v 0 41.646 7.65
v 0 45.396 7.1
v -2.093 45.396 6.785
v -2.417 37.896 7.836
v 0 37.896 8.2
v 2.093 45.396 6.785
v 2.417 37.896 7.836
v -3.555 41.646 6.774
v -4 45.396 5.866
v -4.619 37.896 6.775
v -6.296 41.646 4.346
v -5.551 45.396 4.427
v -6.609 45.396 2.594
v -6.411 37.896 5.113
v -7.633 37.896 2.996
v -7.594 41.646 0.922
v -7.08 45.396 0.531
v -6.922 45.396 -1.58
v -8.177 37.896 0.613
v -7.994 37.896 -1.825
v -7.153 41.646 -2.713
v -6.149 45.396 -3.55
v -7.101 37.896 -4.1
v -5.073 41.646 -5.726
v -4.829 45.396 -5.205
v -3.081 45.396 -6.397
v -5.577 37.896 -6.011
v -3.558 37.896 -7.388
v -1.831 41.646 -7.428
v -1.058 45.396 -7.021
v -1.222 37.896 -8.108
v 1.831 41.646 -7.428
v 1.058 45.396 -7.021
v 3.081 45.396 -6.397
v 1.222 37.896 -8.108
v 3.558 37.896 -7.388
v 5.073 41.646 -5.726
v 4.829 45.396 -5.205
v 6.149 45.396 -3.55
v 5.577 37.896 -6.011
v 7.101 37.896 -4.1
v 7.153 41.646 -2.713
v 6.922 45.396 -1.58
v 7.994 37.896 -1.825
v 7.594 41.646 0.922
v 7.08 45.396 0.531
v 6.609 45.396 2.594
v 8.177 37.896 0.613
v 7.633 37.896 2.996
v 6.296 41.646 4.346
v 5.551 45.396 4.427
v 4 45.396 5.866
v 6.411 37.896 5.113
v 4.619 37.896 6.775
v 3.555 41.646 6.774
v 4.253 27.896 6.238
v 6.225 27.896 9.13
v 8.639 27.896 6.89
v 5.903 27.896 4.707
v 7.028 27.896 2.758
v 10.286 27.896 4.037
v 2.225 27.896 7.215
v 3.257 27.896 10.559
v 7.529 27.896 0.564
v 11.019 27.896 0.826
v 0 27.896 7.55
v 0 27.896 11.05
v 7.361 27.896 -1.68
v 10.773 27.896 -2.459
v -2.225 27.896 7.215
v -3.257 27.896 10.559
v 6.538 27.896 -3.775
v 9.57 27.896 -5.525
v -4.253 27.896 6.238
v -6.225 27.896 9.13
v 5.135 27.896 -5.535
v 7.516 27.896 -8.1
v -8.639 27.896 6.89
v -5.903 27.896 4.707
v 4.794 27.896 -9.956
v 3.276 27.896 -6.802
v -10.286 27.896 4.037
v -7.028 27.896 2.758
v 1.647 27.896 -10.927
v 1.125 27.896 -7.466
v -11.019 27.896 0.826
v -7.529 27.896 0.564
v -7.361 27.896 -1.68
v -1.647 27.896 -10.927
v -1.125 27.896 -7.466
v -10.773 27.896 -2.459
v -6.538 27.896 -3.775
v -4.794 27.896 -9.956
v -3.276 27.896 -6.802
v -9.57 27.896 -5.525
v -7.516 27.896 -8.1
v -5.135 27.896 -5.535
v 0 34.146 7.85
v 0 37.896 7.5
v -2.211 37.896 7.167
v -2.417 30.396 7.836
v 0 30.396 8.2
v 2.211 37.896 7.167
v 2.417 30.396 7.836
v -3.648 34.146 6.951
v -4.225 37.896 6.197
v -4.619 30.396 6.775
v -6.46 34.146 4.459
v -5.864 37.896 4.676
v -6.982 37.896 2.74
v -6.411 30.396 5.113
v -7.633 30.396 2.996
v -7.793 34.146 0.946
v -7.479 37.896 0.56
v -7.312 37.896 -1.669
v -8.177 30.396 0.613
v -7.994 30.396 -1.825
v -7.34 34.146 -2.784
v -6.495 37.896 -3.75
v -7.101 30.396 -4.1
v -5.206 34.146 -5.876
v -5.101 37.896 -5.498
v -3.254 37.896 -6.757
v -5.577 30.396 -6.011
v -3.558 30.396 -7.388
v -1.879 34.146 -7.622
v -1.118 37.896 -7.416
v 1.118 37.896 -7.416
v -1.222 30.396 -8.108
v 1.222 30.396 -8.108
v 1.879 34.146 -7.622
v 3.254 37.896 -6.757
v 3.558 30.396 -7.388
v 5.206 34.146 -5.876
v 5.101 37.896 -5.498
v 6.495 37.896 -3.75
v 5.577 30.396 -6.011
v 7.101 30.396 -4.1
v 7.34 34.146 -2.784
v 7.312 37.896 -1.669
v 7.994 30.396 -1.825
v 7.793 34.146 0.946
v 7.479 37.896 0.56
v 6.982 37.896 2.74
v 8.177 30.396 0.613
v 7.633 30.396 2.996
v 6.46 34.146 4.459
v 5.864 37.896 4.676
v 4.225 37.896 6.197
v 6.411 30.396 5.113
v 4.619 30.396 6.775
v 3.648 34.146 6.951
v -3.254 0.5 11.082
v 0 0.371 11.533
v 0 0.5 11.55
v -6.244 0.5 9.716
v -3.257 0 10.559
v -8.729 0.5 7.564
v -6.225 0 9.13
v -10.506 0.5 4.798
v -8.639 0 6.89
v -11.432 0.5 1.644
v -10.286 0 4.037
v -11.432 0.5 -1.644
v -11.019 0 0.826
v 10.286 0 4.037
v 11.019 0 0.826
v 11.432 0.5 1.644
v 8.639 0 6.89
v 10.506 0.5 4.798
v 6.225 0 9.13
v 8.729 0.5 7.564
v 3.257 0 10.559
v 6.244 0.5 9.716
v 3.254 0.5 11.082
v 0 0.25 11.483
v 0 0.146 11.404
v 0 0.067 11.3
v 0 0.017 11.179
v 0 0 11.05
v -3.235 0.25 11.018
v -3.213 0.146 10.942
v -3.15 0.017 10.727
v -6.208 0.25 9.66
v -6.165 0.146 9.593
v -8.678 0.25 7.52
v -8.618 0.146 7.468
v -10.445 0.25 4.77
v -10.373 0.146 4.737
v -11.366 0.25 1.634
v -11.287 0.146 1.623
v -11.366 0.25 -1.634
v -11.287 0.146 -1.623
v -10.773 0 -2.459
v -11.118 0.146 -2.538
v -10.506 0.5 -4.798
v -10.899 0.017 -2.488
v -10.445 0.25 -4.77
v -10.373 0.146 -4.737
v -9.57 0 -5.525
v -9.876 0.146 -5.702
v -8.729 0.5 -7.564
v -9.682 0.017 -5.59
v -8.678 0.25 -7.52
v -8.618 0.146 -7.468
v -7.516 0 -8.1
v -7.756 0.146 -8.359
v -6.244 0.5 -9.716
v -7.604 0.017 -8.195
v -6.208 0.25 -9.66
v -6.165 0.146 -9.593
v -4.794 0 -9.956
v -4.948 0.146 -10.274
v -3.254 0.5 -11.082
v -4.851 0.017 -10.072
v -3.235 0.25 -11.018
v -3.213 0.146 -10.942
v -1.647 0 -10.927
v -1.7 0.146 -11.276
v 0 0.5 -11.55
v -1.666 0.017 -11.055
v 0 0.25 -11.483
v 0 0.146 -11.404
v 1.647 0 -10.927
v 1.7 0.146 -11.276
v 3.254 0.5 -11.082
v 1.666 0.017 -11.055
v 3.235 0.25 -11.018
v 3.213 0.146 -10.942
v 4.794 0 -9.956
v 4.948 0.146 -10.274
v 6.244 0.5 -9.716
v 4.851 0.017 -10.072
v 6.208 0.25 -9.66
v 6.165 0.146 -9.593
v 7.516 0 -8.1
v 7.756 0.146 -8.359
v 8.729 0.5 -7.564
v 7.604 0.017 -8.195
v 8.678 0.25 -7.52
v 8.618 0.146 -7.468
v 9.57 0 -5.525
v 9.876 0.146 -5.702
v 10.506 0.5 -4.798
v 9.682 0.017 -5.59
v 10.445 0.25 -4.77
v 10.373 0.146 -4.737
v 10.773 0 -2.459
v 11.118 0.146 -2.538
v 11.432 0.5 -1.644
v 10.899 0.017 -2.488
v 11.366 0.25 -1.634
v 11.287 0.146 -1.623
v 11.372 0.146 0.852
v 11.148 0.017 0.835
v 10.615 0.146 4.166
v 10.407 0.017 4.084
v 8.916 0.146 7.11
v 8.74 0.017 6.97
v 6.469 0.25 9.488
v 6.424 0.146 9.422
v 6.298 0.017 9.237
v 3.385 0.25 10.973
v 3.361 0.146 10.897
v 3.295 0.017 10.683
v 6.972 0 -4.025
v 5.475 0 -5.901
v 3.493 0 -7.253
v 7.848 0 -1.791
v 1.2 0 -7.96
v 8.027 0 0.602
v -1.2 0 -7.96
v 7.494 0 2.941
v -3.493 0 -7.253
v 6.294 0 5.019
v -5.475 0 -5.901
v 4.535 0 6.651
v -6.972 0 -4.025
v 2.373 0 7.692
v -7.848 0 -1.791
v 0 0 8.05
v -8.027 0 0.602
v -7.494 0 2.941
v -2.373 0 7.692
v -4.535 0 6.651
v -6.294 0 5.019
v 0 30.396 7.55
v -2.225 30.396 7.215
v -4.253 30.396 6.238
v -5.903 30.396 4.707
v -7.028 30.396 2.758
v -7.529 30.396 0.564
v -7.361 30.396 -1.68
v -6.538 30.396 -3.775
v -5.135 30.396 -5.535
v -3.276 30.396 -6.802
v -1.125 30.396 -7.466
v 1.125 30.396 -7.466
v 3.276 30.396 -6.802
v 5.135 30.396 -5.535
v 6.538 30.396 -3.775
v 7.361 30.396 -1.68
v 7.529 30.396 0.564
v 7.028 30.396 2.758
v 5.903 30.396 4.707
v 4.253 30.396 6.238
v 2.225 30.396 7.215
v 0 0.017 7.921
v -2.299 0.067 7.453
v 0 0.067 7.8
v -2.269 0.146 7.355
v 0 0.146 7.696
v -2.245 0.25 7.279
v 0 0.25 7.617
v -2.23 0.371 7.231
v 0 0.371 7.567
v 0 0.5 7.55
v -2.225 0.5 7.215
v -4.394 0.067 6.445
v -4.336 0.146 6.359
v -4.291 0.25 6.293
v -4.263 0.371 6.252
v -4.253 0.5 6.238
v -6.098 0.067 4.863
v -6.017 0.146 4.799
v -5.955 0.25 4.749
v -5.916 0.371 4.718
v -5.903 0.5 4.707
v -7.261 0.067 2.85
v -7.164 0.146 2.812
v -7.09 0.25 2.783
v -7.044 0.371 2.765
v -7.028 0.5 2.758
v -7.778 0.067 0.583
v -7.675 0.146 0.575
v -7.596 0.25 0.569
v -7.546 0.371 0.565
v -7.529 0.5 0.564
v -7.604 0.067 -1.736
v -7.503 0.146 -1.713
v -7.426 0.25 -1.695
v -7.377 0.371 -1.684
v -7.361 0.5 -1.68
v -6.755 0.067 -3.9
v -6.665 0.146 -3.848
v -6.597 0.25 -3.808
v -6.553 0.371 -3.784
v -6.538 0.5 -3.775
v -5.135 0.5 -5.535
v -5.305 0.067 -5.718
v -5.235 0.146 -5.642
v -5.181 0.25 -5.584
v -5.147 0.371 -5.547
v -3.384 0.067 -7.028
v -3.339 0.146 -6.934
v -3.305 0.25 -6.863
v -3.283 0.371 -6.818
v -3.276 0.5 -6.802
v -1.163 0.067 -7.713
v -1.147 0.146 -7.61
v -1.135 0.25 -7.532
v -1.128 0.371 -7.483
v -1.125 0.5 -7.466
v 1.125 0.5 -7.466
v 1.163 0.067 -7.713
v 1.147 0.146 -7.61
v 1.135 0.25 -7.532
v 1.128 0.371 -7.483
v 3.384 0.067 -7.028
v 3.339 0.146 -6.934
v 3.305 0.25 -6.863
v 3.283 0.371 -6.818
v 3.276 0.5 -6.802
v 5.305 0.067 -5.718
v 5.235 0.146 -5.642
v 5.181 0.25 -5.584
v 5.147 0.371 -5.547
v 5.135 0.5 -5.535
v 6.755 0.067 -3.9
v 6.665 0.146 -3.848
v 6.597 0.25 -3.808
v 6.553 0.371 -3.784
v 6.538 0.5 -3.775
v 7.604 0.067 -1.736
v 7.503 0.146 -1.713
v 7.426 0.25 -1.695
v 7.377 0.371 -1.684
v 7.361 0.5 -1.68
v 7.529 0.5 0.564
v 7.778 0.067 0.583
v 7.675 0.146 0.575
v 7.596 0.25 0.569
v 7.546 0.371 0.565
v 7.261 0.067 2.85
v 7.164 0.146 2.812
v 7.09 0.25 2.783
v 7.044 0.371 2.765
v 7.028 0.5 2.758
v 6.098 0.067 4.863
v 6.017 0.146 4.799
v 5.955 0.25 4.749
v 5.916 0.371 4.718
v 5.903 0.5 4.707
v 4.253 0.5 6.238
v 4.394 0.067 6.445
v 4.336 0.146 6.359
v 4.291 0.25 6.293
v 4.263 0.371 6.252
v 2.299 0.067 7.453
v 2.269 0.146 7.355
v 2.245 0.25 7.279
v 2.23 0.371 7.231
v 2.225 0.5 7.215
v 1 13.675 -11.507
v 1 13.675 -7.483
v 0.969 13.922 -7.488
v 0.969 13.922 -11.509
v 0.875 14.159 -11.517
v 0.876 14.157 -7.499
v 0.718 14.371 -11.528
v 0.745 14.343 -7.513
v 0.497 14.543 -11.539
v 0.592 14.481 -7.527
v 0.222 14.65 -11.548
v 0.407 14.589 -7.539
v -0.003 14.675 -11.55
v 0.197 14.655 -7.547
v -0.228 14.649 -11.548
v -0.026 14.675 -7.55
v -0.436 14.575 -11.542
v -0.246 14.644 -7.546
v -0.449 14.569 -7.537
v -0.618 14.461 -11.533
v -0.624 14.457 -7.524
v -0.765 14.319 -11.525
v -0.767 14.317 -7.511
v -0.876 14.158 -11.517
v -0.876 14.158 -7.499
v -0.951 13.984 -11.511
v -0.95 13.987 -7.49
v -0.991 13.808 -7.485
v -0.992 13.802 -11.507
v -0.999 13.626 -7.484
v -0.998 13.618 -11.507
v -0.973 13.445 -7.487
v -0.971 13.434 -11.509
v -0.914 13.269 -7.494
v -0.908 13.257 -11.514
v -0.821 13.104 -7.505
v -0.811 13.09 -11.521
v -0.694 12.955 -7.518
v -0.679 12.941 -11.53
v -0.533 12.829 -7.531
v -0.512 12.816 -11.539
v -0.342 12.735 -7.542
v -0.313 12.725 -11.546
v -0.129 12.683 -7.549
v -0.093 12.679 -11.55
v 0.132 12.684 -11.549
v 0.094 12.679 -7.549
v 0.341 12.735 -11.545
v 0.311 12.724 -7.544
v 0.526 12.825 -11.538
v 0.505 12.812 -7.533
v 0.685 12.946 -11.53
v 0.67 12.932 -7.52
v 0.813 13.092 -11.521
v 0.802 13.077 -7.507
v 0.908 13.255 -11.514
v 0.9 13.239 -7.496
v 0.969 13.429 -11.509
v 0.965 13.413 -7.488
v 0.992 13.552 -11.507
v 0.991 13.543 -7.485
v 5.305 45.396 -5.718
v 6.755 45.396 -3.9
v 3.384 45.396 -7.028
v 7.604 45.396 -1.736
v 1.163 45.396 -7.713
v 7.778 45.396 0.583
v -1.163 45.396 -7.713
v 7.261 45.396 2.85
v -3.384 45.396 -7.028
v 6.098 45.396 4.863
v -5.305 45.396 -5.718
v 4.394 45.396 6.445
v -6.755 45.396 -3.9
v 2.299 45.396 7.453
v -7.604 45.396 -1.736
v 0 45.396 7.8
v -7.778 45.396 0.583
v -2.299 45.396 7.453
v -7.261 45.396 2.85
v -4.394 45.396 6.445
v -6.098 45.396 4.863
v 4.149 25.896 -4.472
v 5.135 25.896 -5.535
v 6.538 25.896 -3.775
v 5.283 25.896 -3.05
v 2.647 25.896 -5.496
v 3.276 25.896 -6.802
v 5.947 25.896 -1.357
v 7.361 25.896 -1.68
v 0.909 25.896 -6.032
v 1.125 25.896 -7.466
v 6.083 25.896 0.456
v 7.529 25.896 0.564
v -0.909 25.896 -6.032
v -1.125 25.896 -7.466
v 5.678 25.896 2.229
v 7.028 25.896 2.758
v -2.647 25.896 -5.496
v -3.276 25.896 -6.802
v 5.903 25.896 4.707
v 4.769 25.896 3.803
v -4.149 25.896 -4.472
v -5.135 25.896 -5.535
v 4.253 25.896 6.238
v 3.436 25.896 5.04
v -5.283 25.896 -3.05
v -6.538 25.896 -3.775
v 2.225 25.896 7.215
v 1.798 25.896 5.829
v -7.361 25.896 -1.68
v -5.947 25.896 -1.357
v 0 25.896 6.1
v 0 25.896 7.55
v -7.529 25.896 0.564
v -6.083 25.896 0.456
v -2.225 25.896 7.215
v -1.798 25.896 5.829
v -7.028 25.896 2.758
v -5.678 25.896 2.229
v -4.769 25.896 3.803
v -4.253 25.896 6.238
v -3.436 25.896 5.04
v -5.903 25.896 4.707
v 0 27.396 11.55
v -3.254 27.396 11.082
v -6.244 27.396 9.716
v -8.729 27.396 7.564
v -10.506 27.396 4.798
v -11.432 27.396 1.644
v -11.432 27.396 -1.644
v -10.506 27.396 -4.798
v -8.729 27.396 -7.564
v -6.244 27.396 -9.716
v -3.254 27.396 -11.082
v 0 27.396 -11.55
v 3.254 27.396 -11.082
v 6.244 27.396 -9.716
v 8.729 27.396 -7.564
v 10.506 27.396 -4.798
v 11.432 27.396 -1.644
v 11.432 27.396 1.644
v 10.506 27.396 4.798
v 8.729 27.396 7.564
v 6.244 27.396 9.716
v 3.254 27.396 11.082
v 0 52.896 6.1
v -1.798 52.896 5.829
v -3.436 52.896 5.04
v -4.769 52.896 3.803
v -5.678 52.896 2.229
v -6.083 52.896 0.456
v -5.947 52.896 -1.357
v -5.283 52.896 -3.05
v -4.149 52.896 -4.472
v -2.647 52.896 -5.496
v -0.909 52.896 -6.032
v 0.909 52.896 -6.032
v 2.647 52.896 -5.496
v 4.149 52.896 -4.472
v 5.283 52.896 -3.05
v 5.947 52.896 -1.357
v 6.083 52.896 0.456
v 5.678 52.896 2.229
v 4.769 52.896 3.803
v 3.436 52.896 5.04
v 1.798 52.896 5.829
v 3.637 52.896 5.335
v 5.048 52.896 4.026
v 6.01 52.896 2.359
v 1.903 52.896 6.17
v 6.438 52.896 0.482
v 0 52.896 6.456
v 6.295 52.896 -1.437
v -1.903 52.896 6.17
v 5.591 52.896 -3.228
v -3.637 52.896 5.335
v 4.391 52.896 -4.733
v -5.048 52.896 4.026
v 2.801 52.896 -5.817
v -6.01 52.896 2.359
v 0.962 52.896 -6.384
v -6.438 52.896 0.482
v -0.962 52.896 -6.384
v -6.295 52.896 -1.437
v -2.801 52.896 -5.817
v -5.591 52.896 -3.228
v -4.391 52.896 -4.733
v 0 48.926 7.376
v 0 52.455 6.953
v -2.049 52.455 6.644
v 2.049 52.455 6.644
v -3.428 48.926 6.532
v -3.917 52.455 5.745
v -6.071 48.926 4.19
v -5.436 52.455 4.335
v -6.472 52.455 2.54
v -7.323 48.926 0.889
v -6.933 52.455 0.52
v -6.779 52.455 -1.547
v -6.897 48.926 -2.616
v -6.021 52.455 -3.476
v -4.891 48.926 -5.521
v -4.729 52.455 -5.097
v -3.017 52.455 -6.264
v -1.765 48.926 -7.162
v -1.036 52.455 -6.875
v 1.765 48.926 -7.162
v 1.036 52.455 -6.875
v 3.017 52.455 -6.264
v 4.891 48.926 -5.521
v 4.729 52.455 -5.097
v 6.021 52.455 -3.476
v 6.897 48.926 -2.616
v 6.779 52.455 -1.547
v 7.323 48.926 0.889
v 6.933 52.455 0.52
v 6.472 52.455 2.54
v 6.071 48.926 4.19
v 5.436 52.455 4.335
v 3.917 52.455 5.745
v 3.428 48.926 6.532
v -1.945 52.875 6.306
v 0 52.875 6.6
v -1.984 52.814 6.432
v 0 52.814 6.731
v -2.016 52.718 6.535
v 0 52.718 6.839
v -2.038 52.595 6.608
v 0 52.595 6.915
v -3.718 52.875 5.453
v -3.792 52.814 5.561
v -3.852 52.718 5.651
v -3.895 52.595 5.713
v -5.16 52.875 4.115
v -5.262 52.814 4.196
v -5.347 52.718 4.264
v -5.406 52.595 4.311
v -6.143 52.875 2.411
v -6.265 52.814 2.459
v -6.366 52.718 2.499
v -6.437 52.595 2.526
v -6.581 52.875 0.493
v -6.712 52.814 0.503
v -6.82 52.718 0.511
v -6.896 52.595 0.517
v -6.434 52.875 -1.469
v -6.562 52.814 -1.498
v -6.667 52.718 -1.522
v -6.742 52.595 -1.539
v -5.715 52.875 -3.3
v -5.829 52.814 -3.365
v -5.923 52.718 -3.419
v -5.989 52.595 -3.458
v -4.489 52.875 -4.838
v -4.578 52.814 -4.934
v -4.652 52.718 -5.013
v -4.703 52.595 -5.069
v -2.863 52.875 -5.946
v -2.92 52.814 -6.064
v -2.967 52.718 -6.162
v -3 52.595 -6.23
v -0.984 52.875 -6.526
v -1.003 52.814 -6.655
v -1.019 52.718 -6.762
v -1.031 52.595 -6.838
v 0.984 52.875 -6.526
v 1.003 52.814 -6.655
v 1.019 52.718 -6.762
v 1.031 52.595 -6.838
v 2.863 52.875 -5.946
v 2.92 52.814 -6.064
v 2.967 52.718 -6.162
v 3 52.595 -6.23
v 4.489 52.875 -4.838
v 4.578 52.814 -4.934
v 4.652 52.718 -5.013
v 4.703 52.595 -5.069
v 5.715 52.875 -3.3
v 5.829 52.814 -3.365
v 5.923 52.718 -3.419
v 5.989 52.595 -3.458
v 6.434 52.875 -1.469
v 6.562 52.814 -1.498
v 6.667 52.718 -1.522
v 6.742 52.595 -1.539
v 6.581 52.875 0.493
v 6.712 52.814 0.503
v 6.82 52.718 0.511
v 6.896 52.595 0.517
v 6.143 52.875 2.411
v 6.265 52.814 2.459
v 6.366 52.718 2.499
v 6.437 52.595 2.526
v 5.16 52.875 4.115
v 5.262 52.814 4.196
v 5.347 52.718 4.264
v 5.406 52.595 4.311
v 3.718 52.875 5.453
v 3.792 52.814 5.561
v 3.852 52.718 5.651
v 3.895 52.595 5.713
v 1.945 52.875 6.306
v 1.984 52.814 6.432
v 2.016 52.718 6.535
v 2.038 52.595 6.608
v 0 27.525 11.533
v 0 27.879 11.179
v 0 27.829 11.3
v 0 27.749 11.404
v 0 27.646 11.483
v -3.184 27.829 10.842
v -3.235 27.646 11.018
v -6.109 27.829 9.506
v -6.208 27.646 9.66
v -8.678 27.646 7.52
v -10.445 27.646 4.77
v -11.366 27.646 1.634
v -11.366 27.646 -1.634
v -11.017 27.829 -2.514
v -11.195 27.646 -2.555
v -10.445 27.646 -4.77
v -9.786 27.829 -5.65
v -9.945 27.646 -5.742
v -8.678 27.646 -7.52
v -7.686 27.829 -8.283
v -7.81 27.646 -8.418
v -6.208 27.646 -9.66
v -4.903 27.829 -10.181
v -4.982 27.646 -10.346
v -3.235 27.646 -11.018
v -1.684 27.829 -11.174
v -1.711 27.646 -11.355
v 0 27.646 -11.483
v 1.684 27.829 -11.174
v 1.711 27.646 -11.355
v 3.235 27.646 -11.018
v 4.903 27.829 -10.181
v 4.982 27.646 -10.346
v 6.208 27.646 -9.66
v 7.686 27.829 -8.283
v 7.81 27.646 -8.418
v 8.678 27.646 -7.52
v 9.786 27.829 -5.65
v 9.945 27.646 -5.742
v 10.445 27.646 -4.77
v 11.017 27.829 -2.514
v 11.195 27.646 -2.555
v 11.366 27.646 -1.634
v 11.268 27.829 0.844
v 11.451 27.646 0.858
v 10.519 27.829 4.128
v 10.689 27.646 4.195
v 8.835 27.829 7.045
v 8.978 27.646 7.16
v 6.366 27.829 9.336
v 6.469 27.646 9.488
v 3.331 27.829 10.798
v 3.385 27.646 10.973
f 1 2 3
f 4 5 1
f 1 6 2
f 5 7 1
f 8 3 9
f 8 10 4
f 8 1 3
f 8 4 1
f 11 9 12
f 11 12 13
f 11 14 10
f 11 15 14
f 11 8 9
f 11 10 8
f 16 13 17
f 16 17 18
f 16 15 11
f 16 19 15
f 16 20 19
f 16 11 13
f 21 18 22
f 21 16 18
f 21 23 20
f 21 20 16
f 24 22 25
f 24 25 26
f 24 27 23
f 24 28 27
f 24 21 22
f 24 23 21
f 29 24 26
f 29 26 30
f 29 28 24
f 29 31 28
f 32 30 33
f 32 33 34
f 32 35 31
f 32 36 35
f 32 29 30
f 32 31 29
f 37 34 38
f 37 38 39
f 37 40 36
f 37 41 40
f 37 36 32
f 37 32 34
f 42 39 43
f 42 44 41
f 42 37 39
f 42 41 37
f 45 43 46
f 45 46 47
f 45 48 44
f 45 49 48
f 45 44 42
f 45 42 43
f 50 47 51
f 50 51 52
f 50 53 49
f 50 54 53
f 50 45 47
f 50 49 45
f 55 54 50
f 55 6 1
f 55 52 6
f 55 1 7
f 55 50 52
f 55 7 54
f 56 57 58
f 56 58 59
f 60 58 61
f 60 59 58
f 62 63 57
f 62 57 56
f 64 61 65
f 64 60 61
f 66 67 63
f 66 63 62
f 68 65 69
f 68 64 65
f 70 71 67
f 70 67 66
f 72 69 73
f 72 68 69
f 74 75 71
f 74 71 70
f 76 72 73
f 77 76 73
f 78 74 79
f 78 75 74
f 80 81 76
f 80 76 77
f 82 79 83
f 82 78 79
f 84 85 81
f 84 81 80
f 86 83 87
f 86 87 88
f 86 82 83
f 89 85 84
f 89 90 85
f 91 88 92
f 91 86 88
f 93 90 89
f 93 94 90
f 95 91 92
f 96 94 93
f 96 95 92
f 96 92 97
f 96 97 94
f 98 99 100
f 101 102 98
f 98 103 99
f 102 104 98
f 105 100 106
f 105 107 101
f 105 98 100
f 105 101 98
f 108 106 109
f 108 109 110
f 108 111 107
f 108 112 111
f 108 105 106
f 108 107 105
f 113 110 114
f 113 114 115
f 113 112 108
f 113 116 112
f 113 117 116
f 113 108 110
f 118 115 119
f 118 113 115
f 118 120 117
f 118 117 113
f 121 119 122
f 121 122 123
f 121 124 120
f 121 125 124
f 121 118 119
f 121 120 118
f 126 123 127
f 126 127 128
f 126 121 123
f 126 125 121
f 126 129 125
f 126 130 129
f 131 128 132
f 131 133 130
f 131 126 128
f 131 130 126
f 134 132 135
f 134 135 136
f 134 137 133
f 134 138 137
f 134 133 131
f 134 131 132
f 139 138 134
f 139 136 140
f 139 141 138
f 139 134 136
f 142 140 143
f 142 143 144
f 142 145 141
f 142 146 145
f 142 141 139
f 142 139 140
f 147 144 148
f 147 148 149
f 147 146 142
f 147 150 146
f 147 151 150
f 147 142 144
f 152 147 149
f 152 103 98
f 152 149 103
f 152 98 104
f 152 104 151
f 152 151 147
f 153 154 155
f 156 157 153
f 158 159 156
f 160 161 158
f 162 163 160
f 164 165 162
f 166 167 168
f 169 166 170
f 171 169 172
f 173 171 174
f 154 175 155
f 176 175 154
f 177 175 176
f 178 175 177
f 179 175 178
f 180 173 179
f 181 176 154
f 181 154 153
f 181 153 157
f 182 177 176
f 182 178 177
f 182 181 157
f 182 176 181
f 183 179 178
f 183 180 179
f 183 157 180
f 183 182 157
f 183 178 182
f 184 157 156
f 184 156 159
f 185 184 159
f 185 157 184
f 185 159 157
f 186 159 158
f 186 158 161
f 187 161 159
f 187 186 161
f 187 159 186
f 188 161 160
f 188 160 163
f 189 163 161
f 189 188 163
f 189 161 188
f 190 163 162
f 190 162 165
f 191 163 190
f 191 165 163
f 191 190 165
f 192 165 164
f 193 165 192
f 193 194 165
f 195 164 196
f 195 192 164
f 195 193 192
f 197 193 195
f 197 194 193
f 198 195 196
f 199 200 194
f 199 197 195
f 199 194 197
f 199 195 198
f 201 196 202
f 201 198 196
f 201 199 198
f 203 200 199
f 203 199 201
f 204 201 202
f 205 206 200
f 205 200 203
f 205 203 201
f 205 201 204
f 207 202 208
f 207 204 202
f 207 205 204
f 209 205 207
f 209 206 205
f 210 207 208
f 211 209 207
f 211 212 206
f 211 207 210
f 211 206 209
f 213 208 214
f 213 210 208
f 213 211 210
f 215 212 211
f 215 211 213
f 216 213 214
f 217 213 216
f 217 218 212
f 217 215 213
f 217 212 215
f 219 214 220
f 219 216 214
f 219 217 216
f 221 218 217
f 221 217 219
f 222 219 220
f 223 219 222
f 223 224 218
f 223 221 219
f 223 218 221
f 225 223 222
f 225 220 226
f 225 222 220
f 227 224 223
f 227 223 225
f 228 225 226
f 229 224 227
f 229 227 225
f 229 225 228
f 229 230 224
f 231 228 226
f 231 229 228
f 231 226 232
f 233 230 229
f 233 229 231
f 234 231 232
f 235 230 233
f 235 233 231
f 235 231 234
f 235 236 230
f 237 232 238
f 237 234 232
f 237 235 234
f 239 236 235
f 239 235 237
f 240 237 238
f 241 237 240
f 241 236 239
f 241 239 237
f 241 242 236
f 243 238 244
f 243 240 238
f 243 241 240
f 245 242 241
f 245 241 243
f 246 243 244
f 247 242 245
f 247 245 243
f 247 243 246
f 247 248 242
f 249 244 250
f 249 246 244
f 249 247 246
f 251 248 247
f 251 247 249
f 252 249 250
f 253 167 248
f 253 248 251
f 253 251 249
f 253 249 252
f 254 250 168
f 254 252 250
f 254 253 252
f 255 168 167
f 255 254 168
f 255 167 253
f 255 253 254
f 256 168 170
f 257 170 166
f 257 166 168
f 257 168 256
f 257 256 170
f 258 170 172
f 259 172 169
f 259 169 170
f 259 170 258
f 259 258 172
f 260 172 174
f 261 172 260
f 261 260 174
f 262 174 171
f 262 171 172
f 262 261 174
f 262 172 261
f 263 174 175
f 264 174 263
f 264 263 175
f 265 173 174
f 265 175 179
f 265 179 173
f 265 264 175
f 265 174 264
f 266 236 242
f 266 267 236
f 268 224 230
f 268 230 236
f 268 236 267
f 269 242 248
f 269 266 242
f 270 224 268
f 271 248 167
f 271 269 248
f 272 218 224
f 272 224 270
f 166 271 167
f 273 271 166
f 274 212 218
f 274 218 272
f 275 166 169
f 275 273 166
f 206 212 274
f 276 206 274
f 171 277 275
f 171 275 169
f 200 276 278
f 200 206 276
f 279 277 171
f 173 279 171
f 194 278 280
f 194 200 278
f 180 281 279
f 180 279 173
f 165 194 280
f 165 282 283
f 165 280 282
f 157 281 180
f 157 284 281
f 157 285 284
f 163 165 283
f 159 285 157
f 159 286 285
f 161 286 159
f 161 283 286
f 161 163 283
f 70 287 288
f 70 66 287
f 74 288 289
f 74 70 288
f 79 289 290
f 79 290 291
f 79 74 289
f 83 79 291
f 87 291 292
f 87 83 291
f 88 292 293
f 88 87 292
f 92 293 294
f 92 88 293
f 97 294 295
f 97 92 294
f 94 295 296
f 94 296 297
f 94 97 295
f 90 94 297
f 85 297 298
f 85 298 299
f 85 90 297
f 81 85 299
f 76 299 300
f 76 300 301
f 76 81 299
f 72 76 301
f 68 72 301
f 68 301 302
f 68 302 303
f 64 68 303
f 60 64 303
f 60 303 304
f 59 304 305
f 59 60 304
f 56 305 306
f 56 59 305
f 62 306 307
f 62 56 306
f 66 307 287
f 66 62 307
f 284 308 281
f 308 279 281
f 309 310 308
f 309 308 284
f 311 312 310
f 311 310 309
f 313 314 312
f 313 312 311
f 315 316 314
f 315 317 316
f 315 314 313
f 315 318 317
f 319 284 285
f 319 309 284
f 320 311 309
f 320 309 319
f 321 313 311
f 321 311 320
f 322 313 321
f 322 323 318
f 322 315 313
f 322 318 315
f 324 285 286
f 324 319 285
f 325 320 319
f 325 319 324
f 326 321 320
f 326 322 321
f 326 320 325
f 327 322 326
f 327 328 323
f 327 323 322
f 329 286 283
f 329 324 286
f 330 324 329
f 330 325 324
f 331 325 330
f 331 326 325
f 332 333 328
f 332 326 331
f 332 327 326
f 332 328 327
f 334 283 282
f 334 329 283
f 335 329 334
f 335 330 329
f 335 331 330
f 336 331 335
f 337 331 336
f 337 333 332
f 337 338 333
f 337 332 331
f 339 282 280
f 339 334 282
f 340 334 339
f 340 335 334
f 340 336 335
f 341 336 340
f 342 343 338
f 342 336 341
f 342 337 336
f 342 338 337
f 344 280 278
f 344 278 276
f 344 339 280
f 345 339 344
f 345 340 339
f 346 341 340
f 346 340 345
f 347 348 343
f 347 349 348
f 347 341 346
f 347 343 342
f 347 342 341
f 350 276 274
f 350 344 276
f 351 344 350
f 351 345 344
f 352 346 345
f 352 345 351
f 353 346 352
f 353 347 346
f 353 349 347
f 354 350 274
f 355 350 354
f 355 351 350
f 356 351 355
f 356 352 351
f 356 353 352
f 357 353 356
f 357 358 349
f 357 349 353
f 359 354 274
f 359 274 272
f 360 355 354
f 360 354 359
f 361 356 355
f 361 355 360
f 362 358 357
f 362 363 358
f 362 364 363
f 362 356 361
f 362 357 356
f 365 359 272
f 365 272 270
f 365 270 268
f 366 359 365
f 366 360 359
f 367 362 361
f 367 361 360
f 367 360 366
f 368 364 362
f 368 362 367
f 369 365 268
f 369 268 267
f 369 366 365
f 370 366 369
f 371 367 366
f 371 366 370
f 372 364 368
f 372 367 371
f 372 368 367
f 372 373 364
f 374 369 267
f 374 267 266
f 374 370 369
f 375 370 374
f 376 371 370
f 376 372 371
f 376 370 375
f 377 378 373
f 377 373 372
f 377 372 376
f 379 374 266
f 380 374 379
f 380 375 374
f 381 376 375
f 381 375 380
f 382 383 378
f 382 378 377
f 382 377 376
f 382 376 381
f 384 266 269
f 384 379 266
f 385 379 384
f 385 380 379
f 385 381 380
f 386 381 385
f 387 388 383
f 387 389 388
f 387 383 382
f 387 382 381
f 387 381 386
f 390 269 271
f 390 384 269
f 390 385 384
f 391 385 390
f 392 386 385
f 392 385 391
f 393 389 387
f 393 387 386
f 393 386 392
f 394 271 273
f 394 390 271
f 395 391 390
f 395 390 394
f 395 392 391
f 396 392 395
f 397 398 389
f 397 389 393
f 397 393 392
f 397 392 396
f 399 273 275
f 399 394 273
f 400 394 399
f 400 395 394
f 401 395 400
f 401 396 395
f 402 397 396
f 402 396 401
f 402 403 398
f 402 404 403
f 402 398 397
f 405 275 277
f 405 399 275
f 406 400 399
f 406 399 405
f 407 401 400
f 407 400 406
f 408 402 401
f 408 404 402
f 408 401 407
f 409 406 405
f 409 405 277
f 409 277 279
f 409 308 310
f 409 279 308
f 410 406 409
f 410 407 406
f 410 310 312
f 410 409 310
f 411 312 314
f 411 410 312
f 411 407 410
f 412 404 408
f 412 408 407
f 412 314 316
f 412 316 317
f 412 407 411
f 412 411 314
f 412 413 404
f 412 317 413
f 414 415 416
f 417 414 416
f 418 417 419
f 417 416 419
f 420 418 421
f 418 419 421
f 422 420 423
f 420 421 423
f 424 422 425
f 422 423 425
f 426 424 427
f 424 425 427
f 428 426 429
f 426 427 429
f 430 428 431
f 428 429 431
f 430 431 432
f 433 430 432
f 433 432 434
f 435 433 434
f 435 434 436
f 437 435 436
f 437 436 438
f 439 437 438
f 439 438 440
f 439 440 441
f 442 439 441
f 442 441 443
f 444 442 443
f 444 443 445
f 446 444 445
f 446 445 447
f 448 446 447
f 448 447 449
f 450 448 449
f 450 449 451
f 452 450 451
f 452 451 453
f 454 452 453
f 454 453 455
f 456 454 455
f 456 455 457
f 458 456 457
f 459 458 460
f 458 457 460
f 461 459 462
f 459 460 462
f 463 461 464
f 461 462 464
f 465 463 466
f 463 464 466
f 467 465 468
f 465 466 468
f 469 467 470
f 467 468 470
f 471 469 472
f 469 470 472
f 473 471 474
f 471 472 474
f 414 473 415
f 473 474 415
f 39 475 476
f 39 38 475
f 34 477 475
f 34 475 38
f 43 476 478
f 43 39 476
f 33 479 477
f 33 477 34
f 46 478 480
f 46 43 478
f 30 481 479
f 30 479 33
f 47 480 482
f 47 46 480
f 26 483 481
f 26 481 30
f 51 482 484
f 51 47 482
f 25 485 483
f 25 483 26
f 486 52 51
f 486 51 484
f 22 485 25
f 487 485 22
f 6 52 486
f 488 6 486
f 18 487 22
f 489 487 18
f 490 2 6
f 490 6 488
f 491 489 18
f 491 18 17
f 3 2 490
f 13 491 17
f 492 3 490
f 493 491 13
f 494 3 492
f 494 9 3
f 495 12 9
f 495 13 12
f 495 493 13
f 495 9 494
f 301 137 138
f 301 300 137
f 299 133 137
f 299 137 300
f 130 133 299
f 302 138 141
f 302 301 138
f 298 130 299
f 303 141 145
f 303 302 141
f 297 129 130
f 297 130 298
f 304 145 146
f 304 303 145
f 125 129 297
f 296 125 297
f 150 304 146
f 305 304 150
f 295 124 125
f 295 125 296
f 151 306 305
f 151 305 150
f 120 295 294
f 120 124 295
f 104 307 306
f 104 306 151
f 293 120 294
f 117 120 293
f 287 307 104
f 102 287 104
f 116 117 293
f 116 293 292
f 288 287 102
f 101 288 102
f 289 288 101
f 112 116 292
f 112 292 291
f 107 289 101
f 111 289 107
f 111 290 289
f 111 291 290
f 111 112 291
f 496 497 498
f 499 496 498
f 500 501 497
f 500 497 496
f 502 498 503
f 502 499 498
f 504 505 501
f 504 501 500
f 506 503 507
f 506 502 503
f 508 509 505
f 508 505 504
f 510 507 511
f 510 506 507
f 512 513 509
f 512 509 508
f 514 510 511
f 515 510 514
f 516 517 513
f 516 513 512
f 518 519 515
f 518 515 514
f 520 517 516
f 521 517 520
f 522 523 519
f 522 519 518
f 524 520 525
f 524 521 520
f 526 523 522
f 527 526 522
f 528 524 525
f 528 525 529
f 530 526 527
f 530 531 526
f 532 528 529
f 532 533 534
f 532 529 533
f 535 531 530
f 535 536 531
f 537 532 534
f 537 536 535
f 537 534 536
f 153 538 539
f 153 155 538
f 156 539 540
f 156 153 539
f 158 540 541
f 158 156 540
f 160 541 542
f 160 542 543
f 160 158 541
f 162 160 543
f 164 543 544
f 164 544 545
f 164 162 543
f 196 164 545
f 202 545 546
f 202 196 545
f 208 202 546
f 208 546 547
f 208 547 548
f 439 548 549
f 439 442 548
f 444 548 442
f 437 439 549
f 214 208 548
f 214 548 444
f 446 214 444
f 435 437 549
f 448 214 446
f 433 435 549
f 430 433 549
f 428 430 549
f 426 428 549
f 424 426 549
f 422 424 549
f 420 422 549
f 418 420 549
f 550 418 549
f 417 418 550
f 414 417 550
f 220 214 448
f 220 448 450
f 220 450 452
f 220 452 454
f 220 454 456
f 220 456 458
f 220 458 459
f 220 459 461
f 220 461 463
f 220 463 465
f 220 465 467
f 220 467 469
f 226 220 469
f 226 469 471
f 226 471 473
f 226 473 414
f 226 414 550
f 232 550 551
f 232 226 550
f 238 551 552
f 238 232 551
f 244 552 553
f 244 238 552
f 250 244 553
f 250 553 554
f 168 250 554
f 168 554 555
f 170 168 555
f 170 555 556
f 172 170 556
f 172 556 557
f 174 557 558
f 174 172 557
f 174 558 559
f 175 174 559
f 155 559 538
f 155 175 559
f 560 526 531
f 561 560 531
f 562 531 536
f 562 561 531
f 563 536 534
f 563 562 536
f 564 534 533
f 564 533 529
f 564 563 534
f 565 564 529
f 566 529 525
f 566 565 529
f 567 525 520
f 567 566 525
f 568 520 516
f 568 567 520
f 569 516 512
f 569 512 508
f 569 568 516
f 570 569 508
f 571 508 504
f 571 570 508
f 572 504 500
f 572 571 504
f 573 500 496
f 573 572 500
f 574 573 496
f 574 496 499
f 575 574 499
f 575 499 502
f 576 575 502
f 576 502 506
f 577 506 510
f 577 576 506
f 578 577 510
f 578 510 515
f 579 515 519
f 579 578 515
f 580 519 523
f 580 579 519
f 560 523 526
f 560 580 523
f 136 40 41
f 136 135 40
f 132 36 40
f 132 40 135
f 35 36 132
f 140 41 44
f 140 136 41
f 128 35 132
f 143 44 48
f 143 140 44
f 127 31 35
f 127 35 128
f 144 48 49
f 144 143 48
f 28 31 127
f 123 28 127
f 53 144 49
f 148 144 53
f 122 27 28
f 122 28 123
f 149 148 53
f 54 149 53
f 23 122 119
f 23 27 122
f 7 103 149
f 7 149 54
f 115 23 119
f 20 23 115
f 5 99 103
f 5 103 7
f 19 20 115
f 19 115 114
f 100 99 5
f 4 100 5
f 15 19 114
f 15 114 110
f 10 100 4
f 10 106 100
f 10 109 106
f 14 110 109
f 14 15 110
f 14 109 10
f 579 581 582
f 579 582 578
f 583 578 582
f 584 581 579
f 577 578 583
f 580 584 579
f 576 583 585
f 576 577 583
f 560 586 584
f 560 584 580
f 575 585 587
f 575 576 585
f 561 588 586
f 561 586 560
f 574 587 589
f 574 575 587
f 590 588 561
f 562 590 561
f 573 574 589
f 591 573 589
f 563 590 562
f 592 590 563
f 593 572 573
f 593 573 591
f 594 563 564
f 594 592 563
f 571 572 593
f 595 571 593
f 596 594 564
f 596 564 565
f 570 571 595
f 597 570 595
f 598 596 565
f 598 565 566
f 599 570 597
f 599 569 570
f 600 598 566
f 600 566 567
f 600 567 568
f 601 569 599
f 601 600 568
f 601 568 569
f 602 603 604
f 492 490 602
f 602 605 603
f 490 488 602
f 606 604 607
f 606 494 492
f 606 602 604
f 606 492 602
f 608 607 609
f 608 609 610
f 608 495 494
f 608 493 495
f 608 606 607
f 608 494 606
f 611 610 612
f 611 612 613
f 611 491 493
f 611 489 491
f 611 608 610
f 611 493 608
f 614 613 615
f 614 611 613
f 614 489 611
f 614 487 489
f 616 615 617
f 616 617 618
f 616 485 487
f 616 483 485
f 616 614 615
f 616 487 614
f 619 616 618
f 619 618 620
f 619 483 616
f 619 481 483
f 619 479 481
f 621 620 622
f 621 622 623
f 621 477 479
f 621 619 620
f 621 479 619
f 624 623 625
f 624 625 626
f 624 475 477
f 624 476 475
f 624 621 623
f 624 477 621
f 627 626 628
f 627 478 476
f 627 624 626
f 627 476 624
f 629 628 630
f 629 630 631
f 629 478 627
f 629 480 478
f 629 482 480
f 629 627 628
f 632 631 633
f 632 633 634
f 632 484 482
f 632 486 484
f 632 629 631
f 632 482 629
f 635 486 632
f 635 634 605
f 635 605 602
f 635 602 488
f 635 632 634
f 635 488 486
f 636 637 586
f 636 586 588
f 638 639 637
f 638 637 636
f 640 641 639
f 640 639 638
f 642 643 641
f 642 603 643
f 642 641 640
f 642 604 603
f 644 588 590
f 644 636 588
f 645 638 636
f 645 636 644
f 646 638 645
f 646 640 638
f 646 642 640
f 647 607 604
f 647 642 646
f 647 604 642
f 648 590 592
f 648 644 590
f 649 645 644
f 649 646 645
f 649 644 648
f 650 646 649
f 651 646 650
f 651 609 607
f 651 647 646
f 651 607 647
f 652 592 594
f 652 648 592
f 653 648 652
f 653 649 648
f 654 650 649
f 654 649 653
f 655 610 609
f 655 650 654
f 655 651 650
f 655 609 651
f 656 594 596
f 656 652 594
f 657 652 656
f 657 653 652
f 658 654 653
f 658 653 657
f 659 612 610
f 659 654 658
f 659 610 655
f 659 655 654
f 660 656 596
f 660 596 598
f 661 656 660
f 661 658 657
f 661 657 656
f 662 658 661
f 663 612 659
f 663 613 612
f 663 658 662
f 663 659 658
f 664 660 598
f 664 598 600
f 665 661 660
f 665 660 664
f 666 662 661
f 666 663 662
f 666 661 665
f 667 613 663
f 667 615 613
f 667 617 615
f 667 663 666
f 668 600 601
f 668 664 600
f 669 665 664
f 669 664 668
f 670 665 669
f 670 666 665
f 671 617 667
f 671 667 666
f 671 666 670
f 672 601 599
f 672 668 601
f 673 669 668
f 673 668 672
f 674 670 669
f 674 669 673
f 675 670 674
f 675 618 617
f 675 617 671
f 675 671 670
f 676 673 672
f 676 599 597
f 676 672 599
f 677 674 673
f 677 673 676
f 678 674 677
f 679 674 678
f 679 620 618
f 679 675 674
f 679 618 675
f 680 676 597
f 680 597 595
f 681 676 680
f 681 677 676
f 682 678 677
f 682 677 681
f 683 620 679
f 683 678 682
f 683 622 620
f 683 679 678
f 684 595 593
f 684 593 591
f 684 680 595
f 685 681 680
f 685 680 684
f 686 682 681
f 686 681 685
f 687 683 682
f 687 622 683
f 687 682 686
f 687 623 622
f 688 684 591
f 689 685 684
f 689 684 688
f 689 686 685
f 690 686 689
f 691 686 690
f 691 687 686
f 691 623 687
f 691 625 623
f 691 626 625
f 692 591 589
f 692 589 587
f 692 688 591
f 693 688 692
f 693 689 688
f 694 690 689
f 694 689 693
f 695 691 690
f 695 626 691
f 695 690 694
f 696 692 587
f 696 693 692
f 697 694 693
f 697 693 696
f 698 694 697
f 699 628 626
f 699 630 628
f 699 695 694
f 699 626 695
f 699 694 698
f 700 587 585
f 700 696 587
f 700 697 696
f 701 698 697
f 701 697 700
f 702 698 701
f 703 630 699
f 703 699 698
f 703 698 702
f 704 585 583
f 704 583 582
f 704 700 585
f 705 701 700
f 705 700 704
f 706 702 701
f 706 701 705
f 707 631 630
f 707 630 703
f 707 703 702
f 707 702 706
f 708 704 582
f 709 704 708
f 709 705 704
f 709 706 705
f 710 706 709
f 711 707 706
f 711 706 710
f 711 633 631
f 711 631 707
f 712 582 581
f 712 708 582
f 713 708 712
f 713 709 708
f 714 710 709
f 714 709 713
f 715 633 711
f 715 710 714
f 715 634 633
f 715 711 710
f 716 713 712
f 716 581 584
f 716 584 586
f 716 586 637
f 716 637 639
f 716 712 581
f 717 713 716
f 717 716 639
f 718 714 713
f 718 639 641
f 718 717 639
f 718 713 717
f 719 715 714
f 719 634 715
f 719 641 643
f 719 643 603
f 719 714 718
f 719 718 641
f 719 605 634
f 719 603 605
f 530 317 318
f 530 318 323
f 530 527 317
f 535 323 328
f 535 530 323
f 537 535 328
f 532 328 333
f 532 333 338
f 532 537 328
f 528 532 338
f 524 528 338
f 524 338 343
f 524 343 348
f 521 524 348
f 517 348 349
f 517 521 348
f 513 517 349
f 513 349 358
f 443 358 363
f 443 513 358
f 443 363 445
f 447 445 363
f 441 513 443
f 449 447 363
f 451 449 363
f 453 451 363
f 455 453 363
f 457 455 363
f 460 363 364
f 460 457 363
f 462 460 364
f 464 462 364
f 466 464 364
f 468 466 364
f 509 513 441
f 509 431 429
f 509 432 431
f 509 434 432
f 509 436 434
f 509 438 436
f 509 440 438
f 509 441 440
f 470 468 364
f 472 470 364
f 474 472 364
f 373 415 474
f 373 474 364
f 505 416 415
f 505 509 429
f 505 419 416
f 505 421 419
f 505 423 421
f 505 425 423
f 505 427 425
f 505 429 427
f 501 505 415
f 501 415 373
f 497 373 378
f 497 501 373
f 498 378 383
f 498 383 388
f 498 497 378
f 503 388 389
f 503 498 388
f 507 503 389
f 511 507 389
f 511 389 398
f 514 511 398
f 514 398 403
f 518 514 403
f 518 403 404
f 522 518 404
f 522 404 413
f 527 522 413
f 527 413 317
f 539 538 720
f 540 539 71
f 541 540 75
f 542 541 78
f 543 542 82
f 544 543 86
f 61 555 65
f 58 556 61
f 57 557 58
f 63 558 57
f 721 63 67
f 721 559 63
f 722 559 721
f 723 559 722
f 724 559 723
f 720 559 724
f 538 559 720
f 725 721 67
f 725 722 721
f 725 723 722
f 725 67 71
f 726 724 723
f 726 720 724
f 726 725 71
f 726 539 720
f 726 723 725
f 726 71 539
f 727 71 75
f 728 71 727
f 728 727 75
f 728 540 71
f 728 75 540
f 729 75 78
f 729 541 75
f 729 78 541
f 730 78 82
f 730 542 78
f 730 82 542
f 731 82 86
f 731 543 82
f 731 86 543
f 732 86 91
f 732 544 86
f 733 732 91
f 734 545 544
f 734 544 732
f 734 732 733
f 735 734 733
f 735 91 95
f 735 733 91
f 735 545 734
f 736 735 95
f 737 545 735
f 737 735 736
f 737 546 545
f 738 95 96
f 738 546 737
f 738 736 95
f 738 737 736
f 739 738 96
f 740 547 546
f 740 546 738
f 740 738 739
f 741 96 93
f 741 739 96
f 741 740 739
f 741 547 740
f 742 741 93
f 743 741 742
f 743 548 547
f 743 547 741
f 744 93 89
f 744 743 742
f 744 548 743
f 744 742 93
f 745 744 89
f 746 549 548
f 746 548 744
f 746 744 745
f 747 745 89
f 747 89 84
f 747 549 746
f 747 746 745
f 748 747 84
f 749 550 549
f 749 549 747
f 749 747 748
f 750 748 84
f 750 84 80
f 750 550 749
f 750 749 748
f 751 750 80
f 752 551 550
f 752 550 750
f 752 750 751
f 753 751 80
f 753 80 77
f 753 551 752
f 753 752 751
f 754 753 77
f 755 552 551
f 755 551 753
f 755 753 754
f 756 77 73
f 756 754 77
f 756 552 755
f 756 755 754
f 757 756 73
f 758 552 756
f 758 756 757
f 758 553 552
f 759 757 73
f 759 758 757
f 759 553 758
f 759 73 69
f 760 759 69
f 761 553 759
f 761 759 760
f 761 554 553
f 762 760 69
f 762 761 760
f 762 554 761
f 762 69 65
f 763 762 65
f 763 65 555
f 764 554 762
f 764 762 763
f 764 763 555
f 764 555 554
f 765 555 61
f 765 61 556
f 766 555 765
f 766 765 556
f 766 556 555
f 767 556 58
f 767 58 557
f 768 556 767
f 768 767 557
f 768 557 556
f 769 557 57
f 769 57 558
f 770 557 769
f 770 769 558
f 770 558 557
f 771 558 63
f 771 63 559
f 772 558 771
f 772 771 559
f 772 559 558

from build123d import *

# Parameters (mm, degrees)
REDONDEO2_R           = 0.5
CROQUIS1_R            = 1
CORTAR_EXTRUIR1_DEPTH = 56.360291205
REDONDEO4_R           = 0.5


with BuildPart() as part:
    # Sketch3 → Revolve1 (revolve)
    with BuildSketch(Plane.XY, mode=Mode.PRIVATE) as revolve1_sk:
        Polygon((7.8, 45.39571665), (7.1, 45.39571665), (8.2, 37.89571665), (7.5, 37.89571665), (8.2, 30.39571665), (7.55, 30.39571665), (7.55, 27.89571665), (11.55, 27.89571665), (11.55, 0), (7.55, 0), (7.55, 25.89571665), (6.1, 25.89571665), (6.1, 52.89571665), (6.9, 52.89571665), align=None)
    revolve(revolve1_sk.sketch.rotate(Axis((0, 70.39571665, 0), (0, -1, 0)), 90), axis=Axis((0, 70.39571665, 0), (0, -1, 0)))

    # Redondeo2
    redondeo2_edges = [part.edges().sort_by_distance(p)[0] for p in [
        (0, 27.89571665, -11.55),
        (0, 0, -11.55),
        (0, 0, -7.55),
    ]]
    fillet(redondeo2_edges, radius=REDONDEO2_R)

    # Croquis1 → Cortar-Extruir1 (cut, through all)
    with BuildSketch(Plane.XY):
        with Locations((0, 13.674991935)):
            Circle(CROQUIS1_R)
    extrude(amount=-CORTAR_EXTRUIR1_DEPTH, mode=Mode.SUBTRACT)

    # Redondeo4
    redondeo4_edges = [part.edges().sort_by_distance(p)[0] for p in [
        (0, 52.89571665, -6.9),
    ]]
    fillet(redondeo4_edges, radius=REDONDEO4_R)


solid = part.part
